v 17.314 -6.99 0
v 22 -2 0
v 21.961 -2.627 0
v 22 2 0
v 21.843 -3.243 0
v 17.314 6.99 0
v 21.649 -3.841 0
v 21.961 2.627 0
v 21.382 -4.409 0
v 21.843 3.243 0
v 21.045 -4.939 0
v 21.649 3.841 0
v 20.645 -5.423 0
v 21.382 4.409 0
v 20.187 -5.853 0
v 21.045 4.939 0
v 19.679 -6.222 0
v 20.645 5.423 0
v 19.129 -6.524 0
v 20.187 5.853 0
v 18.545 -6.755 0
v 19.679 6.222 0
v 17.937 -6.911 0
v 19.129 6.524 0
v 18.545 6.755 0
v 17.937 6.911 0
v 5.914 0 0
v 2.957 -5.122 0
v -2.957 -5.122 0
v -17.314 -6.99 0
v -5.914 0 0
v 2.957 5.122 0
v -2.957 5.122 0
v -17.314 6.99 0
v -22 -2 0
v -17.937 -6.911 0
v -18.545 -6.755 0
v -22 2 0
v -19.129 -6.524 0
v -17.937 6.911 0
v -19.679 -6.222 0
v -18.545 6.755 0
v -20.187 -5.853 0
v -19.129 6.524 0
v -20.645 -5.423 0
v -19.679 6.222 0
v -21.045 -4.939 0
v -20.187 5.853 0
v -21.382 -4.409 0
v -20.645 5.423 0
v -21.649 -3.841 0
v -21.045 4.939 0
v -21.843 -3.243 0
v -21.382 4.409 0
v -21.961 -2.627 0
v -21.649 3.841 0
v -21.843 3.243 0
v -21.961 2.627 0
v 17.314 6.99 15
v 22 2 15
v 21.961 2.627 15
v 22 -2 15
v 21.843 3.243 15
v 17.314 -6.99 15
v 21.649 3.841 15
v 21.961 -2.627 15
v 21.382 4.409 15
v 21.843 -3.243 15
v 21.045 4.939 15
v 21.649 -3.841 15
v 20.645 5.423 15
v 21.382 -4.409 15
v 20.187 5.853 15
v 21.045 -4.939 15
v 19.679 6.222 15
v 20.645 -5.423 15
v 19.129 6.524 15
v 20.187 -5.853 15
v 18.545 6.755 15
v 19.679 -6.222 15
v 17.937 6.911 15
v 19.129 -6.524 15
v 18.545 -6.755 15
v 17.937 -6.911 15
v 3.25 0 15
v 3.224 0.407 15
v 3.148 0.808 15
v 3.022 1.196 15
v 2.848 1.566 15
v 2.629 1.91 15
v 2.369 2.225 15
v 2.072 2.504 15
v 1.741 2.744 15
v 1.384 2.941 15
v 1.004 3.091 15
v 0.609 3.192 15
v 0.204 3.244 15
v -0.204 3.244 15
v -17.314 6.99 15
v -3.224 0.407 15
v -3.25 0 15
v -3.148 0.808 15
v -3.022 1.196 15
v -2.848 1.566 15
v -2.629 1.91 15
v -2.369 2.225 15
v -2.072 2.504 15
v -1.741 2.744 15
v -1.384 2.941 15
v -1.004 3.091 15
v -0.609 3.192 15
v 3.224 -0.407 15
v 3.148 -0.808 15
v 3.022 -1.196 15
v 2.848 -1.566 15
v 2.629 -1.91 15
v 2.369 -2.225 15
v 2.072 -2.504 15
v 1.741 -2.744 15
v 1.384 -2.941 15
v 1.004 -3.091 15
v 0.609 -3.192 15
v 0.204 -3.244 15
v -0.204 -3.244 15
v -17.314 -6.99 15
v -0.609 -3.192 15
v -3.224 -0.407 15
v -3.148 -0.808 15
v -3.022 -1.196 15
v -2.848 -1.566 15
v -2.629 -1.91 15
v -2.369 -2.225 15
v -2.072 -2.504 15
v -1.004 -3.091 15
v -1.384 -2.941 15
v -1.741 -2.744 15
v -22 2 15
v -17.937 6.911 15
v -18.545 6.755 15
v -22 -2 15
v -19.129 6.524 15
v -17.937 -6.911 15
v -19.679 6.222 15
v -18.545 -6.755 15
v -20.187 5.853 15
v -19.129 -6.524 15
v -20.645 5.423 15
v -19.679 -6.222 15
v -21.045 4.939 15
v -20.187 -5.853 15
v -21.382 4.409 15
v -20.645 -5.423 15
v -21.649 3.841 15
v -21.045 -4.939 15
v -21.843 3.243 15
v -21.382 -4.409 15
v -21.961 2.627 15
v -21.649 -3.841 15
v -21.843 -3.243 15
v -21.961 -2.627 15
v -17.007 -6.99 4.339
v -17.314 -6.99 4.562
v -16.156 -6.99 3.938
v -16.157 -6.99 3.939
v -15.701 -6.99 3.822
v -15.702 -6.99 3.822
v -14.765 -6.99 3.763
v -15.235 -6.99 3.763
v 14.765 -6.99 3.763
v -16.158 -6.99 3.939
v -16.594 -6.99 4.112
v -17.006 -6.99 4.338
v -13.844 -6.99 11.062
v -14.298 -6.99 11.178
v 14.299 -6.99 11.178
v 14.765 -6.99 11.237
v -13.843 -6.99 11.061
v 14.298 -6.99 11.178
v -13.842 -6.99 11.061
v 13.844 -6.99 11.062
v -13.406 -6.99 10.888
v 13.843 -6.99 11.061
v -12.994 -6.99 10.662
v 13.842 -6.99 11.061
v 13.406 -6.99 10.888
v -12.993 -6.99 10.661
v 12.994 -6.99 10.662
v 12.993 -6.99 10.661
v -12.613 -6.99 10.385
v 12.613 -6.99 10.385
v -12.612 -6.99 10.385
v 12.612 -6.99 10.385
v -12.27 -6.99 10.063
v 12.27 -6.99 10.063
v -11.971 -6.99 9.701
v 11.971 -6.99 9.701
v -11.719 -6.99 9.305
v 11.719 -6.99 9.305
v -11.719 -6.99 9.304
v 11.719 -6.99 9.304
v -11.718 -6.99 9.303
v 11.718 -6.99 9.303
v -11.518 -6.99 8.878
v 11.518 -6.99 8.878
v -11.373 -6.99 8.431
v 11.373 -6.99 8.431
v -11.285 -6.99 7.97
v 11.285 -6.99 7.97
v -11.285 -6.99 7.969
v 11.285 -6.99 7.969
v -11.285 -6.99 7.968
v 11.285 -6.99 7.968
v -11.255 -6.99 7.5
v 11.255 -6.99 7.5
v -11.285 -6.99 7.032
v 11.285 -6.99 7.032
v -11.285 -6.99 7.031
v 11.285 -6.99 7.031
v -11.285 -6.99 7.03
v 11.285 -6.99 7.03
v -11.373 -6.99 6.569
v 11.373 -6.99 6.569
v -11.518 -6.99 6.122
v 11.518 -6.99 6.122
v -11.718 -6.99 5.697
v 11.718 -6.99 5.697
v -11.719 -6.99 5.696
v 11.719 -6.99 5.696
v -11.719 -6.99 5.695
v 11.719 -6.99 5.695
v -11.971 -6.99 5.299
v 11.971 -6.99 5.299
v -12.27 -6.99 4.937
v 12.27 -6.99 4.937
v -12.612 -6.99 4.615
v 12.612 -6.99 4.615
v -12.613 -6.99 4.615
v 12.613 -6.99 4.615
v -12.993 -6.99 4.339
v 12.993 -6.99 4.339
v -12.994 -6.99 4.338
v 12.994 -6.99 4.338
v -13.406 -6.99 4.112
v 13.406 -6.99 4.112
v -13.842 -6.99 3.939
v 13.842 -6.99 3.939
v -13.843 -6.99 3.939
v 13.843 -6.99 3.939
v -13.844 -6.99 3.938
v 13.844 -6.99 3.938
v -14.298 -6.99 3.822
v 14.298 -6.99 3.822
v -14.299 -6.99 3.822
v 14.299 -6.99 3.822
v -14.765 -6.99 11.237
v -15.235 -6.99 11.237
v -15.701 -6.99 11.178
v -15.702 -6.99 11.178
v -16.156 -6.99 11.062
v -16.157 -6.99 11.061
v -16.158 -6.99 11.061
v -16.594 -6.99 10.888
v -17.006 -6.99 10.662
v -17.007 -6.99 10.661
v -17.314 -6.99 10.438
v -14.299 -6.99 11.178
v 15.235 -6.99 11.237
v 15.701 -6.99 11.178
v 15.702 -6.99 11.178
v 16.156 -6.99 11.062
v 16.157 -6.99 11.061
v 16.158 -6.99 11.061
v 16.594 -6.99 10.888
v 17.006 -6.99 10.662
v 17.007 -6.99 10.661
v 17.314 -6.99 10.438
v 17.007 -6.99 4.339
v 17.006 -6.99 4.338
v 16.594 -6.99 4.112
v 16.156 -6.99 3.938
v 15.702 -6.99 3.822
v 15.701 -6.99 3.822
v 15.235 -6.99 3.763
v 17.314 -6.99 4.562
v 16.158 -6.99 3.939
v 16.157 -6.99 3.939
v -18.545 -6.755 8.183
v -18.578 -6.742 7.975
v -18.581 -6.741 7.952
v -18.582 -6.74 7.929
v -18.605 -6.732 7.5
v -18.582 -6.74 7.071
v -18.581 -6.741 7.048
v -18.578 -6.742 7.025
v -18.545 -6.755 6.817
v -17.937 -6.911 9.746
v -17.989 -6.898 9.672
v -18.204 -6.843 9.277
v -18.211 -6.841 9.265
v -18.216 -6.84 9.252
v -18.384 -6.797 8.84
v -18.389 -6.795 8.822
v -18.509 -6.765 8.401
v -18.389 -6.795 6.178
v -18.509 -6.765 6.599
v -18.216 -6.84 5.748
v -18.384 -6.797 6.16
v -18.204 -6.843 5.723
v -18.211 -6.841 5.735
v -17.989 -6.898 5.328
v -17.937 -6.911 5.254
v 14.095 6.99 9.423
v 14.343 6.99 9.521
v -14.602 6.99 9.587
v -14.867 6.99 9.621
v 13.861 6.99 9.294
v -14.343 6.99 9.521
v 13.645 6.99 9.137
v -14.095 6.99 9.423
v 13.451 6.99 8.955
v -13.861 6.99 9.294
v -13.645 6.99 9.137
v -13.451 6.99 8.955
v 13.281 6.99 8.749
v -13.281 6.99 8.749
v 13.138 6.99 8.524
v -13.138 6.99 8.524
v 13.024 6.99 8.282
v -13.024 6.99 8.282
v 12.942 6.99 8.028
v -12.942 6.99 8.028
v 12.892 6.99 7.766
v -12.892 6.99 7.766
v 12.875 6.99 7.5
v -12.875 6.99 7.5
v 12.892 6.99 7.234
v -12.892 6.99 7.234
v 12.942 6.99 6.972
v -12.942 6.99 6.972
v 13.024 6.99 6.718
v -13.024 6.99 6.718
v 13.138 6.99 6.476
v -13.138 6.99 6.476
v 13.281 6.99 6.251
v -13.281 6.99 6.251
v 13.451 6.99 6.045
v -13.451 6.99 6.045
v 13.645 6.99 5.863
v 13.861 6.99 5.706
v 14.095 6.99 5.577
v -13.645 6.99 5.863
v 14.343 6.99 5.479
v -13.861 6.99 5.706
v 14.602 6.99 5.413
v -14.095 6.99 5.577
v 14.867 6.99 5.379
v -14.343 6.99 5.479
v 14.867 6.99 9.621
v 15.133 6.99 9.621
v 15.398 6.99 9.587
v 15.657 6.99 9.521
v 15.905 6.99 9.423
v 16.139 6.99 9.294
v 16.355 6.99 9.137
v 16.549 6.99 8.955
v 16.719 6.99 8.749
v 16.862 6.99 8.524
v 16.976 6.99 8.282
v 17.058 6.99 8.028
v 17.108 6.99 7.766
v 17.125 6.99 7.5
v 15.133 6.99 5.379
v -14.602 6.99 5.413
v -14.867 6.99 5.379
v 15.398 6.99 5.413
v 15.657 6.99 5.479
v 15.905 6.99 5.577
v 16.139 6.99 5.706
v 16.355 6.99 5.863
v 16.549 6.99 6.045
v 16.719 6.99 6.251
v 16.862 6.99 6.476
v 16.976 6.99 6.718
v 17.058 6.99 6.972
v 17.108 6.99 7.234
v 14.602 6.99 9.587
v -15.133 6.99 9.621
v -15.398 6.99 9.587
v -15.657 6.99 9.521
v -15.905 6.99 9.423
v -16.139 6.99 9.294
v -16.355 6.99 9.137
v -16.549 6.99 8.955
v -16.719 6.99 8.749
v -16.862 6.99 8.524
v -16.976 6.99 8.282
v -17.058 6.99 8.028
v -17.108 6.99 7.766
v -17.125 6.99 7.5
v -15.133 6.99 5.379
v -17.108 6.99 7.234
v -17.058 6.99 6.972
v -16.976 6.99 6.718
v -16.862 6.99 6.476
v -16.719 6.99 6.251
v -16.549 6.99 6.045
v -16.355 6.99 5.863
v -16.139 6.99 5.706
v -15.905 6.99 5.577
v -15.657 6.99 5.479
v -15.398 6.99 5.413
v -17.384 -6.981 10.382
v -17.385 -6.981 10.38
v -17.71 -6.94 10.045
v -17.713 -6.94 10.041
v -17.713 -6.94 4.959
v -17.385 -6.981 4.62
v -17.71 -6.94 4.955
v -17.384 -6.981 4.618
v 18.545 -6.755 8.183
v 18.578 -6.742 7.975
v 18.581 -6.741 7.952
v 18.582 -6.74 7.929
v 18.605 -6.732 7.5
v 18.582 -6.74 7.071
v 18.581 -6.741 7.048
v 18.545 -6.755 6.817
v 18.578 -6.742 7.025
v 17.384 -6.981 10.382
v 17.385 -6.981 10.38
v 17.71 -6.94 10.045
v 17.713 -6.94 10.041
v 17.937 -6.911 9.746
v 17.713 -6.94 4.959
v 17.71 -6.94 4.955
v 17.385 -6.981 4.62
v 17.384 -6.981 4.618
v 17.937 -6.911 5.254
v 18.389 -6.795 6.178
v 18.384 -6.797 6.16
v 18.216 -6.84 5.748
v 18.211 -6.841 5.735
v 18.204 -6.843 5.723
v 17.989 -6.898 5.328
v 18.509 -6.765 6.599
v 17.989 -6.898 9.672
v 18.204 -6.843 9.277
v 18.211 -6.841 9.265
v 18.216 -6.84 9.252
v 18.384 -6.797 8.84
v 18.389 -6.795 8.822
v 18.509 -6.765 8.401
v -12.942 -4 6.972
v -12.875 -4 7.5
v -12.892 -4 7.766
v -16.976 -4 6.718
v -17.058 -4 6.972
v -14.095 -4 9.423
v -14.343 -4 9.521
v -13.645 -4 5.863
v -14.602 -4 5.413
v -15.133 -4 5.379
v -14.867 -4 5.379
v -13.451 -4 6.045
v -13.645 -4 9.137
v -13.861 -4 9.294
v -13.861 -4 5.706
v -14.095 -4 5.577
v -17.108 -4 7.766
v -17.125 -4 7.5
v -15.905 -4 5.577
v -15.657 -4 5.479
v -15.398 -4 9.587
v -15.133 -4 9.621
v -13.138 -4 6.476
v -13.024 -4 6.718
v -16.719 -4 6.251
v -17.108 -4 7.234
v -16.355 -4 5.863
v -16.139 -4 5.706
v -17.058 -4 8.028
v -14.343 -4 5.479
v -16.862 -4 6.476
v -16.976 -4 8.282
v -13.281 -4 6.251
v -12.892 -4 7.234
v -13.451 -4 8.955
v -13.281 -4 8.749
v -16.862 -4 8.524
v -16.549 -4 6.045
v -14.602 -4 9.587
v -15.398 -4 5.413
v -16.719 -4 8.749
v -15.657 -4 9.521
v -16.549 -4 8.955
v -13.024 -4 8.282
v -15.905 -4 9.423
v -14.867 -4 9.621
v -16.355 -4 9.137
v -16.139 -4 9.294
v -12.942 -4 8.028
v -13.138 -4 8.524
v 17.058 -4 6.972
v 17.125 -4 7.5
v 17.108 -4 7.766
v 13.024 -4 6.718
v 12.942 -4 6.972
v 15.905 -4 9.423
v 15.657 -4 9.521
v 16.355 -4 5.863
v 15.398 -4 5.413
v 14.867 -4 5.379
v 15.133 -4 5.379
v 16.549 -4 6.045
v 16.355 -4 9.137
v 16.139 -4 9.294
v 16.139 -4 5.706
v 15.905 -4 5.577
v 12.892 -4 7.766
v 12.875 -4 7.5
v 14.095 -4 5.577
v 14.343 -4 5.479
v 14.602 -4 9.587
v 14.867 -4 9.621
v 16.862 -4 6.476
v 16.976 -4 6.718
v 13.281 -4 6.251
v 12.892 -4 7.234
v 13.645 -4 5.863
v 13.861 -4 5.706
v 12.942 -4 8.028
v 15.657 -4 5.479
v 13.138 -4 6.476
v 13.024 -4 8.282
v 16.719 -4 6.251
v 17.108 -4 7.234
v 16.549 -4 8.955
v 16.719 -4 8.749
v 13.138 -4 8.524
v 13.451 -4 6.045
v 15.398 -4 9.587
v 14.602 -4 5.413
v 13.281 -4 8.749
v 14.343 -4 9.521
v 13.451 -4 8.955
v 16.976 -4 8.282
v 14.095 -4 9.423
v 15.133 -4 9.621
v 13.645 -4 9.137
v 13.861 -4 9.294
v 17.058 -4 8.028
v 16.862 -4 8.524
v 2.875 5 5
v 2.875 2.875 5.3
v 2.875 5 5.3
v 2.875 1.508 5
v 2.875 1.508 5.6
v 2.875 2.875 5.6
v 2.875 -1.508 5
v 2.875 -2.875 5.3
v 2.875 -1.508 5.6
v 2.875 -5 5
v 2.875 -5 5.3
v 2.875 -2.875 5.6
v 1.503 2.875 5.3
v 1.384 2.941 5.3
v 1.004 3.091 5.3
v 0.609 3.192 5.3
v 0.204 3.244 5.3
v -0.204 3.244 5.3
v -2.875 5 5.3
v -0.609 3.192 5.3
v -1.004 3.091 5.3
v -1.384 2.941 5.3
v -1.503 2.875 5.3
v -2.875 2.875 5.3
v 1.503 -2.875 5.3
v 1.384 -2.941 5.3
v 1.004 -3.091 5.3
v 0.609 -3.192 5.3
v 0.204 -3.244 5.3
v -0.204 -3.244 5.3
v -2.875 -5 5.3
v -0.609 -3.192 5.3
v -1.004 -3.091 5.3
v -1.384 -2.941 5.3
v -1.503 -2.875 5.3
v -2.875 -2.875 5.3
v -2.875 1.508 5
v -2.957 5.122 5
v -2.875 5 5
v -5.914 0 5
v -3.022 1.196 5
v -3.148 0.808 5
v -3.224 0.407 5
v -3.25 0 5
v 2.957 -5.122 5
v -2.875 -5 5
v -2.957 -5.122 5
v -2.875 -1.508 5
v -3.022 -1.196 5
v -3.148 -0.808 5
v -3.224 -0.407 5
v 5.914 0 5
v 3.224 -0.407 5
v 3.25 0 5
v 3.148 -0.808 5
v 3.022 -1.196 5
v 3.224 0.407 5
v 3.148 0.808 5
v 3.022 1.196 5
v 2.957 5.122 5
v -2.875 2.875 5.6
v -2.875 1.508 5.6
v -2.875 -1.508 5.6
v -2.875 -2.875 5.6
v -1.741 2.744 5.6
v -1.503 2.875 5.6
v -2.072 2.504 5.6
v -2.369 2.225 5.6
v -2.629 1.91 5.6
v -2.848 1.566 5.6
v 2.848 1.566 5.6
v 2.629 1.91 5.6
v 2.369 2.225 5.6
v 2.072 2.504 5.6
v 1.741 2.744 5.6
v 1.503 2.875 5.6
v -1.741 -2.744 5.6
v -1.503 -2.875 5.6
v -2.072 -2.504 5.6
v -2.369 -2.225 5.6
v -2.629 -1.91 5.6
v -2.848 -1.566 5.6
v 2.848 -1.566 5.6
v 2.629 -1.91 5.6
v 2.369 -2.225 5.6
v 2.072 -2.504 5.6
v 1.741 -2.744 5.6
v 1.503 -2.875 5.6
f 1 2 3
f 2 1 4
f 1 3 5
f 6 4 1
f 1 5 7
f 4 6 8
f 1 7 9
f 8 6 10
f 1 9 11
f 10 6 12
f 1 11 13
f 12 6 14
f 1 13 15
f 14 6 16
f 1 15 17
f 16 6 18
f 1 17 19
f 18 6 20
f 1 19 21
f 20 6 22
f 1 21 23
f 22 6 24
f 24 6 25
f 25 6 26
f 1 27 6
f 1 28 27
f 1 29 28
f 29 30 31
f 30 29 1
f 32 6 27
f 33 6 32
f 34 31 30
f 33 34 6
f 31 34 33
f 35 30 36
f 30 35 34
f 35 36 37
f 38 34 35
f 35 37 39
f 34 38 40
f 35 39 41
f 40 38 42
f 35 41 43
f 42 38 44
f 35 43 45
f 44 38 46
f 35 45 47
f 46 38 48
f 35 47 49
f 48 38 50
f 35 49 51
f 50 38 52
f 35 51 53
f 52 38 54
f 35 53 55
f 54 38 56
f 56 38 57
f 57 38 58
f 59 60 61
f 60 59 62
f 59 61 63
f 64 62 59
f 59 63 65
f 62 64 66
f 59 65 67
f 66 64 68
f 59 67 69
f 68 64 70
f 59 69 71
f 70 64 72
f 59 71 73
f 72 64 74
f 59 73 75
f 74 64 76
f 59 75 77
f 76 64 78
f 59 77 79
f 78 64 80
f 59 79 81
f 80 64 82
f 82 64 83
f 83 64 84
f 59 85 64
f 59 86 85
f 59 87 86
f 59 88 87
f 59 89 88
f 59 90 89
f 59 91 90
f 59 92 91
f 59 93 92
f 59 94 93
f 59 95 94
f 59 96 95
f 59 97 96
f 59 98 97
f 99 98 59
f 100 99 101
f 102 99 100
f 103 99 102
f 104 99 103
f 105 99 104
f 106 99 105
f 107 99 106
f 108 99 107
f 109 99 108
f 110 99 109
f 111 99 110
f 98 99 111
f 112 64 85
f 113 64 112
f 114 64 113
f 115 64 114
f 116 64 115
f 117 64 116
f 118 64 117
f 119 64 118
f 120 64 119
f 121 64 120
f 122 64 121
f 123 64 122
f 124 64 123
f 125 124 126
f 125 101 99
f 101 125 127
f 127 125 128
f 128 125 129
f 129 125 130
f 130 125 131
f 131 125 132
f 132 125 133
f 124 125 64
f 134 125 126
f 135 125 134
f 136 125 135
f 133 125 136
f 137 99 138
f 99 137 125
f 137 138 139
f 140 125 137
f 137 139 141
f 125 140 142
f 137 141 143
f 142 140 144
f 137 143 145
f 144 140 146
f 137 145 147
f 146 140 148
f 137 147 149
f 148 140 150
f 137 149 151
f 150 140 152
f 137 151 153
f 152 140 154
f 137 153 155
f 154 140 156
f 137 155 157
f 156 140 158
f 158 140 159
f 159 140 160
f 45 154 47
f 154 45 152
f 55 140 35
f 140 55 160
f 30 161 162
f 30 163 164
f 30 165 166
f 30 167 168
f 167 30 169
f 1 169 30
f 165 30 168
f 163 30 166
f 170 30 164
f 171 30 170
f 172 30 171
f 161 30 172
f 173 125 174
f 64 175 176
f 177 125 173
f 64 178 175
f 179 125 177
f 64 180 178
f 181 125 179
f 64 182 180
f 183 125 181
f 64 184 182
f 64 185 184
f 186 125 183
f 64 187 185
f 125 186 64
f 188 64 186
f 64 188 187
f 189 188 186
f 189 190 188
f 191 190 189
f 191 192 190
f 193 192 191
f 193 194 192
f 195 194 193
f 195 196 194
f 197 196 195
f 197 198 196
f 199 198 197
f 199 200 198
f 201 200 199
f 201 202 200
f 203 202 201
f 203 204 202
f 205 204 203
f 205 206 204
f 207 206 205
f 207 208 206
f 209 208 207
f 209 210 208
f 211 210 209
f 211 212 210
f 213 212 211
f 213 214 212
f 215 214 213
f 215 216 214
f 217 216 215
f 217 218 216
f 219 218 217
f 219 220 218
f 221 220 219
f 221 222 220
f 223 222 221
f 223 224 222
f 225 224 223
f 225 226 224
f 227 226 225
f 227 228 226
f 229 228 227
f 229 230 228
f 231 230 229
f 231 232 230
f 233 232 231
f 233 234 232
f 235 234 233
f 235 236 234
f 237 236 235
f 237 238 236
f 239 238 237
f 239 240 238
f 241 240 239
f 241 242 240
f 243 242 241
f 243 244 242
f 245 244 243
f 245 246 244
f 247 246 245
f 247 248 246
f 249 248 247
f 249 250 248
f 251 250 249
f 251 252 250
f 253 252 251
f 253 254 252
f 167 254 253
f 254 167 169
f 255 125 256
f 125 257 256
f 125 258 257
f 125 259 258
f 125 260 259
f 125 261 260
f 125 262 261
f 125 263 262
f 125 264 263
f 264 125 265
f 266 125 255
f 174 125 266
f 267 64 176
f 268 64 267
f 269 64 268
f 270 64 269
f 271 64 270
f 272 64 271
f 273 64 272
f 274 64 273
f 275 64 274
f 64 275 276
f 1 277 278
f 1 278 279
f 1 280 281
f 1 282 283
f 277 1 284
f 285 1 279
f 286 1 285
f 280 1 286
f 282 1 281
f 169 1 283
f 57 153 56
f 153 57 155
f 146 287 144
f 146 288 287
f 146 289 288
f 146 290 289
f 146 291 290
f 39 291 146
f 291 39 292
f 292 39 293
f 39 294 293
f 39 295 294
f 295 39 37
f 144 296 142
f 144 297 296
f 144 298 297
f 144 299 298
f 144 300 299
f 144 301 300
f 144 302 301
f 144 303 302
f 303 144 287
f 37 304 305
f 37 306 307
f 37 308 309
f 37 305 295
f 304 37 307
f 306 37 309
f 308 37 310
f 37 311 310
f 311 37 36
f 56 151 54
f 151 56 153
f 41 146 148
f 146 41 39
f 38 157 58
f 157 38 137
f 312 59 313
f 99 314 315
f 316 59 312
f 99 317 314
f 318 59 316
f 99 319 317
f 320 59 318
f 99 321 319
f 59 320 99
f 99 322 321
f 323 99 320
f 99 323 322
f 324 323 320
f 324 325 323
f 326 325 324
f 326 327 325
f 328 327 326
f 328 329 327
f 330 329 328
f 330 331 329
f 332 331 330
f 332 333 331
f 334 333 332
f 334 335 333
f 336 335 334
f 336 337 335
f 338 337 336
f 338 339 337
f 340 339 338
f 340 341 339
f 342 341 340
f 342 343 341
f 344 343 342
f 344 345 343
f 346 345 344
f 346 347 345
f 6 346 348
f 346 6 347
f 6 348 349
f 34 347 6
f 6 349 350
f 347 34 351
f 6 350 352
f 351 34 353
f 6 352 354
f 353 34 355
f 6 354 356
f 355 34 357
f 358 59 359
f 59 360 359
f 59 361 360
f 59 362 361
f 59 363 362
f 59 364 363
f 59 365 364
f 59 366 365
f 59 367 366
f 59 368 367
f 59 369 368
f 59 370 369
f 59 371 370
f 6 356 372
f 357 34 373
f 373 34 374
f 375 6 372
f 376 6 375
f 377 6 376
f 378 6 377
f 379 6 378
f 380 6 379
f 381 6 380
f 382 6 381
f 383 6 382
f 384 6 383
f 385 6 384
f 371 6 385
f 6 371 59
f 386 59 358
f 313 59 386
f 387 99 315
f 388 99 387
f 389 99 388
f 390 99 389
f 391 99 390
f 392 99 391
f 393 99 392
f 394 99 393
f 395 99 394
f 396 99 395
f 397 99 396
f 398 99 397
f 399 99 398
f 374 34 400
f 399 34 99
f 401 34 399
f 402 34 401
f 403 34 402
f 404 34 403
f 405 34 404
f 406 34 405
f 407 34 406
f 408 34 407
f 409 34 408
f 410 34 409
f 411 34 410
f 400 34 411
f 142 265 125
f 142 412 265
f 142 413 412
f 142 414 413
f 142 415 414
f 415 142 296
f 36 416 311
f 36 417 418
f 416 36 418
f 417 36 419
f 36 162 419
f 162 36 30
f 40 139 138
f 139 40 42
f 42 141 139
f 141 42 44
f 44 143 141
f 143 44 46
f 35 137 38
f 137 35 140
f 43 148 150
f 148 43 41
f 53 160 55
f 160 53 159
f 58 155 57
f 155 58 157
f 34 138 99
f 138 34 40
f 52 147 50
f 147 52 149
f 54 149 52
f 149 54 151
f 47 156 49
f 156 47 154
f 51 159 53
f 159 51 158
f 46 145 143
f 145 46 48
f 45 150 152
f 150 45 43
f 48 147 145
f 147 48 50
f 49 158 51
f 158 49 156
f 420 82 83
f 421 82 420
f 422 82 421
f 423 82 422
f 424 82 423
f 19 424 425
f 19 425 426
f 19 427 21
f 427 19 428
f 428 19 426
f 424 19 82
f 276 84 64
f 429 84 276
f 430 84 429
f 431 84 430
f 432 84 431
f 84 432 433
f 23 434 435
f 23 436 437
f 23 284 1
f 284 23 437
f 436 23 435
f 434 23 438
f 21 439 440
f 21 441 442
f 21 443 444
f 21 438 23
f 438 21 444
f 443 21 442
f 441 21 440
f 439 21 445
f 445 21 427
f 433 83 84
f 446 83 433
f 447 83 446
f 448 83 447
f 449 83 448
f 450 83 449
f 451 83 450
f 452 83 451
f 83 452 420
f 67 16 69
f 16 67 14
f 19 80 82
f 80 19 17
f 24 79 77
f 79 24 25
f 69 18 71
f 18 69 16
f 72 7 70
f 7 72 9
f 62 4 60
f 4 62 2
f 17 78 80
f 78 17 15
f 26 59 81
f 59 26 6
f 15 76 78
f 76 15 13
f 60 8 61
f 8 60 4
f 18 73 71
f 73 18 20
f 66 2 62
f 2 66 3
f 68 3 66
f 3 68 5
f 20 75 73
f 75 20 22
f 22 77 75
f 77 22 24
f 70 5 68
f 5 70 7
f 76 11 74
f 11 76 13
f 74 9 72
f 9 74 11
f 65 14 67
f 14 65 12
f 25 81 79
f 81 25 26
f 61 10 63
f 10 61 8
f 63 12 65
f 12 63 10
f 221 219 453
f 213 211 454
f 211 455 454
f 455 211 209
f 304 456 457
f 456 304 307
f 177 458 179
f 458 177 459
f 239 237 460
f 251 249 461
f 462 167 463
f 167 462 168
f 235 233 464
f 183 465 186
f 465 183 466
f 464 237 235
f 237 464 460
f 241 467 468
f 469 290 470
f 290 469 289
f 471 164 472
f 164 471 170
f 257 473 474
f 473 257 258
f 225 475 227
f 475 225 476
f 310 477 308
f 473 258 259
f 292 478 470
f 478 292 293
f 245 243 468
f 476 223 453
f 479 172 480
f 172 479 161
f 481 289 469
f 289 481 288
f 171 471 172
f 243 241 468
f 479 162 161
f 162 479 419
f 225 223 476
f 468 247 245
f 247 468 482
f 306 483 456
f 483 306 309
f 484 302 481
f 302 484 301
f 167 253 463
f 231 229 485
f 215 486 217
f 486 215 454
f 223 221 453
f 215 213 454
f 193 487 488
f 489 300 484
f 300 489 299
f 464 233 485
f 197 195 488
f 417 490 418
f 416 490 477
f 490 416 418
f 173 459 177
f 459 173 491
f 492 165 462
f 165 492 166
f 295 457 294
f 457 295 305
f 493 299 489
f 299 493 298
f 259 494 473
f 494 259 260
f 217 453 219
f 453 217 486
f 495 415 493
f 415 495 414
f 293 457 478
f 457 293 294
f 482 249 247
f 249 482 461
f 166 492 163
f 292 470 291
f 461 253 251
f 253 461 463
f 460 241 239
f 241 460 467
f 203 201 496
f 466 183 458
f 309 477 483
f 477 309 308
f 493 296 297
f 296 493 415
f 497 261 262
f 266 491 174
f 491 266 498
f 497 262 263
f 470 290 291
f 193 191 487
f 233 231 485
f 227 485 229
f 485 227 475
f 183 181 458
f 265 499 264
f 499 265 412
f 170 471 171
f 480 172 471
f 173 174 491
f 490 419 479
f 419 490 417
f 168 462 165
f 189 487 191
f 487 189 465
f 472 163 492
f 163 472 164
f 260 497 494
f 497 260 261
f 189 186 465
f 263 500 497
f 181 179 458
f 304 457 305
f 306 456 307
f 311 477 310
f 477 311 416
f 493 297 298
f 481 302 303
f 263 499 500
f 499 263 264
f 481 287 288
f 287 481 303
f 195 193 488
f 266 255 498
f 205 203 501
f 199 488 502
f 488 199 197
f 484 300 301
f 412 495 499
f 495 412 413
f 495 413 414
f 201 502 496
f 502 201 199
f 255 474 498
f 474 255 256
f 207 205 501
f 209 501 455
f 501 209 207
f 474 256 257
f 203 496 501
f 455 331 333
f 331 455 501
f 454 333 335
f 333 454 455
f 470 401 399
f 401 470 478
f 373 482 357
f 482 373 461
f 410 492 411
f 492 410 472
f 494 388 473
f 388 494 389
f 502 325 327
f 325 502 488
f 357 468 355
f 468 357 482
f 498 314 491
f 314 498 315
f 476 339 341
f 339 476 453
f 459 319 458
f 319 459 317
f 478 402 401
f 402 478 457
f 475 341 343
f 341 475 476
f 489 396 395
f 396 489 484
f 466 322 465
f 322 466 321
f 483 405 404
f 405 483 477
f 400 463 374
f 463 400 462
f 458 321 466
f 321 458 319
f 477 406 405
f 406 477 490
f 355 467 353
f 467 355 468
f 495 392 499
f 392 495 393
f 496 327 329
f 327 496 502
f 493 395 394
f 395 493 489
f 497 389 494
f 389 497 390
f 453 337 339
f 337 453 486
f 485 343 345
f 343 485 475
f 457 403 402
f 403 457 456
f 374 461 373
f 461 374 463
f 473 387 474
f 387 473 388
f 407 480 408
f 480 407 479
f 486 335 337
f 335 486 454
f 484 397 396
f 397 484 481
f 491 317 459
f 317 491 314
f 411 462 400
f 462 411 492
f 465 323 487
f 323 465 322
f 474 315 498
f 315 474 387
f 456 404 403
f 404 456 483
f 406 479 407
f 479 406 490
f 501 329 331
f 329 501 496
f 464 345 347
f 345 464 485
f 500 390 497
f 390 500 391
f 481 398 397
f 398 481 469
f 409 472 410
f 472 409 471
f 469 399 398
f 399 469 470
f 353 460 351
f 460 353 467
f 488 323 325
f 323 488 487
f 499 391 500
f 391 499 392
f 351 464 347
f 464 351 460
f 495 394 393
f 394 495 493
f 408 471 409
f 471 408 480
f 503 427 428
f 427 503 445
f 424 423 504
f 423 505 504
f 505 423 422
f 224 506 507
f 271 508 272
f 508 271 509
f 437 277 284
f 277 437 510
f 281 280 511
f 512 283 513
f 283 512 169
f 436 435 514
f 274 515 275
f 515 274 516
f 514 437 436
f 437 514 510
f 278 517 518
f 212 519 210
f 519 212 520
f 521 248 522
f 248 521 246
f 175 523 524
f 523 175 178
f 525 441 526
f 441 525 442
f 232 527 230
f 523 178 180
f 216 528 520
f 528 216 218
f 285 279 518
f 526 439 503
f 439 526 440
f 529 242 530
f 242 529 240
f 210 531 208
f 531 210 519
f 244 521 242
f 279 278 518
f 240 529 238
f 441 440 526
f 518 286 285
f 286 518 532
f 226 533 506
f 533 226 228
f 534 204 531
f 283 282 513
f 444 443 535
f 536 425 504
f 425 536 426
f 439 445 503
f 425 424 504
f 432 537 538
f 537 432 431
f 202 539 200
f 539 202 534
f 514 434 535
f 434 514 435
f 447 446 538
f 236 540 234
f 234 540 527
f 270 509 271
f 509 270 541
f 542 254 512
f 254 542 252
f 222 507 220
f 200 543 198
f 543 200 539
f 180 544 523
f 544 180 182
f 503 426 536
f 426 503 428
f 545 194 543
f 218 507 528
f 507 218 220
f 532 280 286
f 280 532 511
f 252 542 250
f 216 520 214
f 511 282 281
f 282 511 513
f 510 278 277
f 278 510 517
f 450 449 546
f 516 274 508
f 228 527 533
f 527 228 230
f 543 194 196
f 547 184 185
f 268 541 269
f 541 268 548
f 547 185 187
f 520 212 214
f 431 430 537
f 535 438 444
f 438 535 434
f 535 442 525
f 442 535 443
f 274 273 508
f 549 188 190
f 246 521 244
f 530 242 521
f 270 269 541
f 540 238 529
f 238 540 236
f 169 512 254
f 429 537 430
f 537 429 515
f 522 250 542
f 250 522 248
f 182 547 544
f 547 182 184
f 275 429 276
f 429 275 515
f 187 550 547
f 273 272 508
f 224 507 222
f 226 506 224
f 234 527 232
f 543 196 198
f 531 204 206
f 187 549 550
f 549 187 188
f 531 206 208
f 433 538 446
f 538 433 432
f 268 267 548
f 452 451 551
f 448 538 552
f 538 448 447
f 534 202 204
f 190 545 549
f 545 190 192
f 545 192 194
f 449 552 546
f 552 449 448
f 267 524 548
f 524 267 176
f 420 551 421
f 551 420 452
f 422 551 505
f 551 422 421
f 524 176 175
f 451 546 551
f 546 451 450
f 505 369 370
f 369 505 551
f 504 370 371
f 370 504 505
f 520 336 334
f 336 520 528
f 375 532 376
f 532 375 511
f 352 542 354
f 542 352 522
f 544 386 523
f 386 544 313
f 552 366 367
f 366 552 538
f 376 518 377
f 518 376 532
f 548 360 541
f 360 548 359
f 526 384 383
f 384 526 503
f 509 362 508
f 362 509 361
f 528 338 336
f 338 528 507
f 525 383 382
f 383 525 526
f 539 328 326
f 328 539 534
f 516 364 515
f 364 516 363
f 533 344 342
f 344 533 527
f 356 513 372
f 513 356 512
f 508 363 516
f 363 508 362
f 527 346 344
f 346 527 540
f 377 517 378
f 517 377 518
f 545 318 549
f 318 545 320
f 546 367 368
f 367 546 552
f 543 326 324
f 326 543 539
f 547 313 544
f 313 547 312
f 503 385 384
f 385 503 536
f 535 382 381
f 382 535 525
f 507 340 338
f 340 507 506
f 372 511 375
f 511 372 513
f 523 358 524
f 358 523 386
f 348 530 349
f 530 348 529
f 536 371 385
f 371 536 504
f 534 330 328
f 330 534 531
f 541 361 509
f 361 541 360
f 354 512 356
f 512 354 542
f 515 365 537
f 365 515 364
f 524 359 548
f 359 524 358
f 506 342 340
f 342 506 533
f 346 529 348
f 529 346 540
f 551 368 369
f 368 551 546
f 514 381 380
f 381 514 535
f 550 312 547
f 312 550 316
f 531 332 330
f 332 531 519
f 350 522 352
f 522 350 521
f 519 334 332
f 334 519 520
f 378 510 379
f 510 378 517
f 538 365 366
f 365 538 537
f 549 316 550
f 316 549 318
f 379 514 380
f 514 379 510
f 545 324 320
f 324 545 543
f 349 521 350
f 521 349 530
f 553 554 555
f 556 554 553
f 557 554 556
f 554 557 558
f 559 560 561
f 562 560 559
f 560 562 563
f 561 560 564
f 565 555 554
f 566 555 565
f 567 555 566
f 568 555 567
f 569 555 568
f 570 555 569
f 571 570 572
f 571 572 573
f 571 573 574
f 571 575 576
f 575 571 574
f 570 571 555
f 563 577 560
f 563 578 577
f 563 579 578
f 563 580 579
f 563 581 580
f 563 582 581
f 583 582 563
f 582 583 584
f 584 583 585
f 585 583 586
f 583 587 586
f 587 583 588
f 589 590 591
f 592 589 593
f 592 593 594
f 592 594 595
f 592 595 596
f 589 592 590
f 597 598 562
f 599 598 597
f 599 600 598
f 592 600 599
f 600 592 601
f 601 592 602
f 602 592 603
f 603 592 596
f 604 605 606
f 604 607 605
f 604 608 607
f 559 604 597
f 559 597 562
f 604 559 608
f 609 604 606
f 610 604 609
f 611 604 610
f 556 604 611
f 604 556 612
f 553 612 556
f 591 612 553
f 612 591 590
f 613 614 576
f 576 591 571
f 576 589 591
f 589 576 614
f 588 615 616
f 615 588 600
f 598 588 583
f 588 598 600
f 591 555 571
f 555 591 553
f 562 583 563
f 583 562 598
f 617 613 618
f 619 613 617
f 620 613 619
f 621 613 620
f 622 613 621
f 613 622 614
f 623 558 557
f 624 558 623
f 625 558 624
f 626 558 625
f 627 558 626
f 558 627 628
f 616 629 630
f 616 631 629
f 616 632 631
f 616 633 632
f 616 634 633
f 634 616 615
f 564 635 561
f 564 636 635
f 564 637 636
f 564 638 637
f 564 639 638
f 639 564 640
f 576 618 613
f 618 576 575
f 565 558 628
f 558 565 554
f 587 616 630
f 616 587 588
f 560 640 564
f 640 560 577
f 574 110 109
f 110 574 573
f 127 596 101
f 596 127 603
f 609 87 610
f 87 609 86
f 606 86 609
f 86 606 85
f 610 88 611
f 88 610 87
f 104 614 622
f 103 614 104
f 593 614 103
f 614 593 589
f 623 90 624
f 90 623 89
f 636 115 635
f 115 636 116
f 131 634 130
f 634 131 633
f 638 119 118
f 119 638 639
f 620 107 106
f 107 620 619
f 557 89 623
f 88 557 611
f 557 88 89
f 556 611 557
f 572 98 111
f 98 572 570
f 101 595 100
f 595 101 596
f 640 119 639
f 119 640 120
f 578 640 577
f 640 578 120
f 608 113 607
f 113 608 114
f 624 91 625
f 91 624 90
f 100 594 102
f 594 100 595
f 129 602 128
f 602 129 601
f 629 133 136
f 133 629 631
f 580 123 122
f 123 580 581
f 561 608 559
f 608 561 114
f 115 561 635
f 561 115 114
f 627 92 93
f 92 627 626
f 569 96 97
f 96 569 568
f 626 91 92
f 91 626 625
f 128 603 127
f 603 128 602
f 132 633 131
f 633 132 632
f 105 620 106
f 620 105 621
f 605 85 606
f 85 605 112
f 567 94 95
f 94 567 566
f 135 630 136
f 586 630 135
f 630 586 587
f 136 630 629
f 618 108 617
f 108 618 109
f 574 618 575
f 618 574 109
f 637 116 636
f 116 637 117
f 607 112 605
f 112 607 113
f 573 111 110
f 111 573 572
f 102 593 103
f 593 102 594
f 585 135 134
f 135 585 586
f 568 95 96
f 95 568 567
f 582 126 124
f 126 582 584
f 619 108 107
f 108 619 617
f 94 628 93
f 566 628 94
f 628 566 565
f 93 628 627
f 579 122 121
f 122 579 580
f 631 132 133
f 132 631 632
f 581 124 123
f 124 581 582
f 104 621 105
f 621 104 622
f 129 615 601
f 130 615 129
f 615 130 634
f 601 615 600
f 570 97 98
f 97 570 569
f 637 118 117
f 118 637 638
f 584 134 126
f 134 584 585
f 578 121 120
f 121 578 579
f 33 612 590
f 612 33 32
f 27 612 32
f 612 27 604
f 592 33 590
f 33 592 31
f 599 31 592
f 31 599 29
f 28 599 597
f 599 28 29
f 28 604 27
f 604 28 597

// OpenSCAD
$fn = 50;


difference() {
	union() {
		cylinder(h = 15, r = 7.0000000000);
		translate(v = [-7.5000000000, 0.0000000000, 0]) {
			hull() {
				translate(v = [-9.5000000000, 2.0000000000, 0]) {
					cylinder(h = 15, r = 5);
				}
				translate(v = [9.5000000000, 2.0000000000, 0]) {
					cylinder(h = 15, r = 5);
				}
				translate(v = [-9.5000000000, -2.0000000000, 0]) {
					cylinder(h = 15, r = 5);
				}
				translate(v = [9.5000000000, -2.0000000000, 0]) {
					cylinder(h = 15, r = 5);
				}
			}
		}
		translate(v = [-7.5000000000, 0.0000000000, 0]) {
			hull() {
				translate(v = [-9.5000000000, 2.0000000000, 0]) {
					cylinder(h = 15, r = 5);
				}
				translate(v = [9.5000000000, 2.0000000000, 0]) {
					cylinder(h = 15, r = 5);
				}
				translate(v = [-9.5000000000, -2.0000000000, 0]) {
					cylinder(h = 15, r = 5);
				}
				translate(v = [9.5000000000, -2.0000000000, 0]) {
					cylinder(h = 15, r = 5);
				}
			}
		}
		translate(v = [7.5000000000, 0.0000000000, 0]) {
			hull() {
				translate(v = [-9.5000000000, 2.0000000000, 0]) {
					cylinder(h = 15, r = 5);
				}
				translate(v = [9.5000000000, 2.0000000000, 0]) {
					cylinder(h = 15, r = 5);
				}
				translate(v = [-9.5000000000, -2.0000000000, 0]) {
					cylinder(h = 15, r = 5);
				}
				translate(v = [9.5000000000, -2.0000000000, 0]) {
					cylinder(h = 15, r = 5);
				}
			}
		}
		translate(v = [7.5000000000, 0.0000000000, 0]) {
			hull() {
				translate(v = [-9.5000000000, 2.0000000000, 0]) {
					cylinder(h = 15, r = 5);
				}
				translate(v = [9.5000000000, 2.0000000000, 0]) {
					cylinder(h = 15, r = 5);
				}
				translate(v = [-9.5000000000, -2.0000000000, 0]) {
					cylinder(h = 15, r = 5);
				}
				translate(v = [9.5000000000, -2.0000000000, 0]) {
					cylinder(h = 15, r = 5);
				}
			}
		}
	}
	union() {
		translate(v = [-15.0000000000, -7.0000000000, 7.5000000000]) {
			rotate(a = [90, 0, 0]) {
				difference() {
					union() {
						#translate(v = [0, 0, -14.0000000000]) {
							cylinder(h = 14, r = 2.0000000000);
						}
						#translate(v = [0, 0, -3]) {
							cylinder(h = 3, r1 = 2.1250000000, r2 = 3.7500000000);
						}
						#translate(v = [0, 0, -14.0000000000]) {
							cylinder(h = 14, r = 2.1250000000);
						}
						#translate(v = [0, 0, -14.0000000000]) {
							cylinder(h = 14, r = 2.0000000000);
						}
					}
					union();
				}
			}
		}
		translate(v = [15.0000000000, -7.0000000000, 7.5000000000]) {
			rotate(a = [90, 0, 0]) {
				difference() {
					union() {
						#translate(v = [0, 0, -14.0000000000]) {
							cylinder(h = 14, r = 2.0000000000);
						}
						#translate(v = [0, 0, -3]) {
							cylinder(h = 3, r1 = 2.1250000000, r2 = 3.7500000000);
						}
						#translate(v = [0, 0, -14.0000000000]) {
							cylinder(h = 14, r = 2.1250000000);
						}
						#translate(v = [0, 0, -14.0000000000]) {
							cylinder(h = 14, r = 2.0000000000);
						}
					}
					union();
				}
			}
		}
		translate(v = [0.0000000000, 0.0000000000, 0]) {
			rotate(a = [0, 0, 0]) {
				difference() {
					union() {
						#translate(v = [-2.8750000000, -5.0000000000, -0.3000000000]) {
							cube(size = [5.7500000000, 10, 0.3000000000]);
						}
						#translate(v = [-2.8750000000, -2.8750000000, -0.6000000000]) {
							cube(size = [5.7500000000, 5.7500000000, 0.3000000000]);
						}
						#translate(v = [-2.8750000000, -5.0000000000, 5]) {
							cube(size = [5.7500000000, 10, 0.3000000000]);
						}
						#translate(v = [-2.8750000000, -2.8750000000, 5.3000000000]) {
							cube(size = [5.7500000000, 5.7500000000, 0.3000000000]);
						}
						#translate(v = [0, 0, -100.0000000000]) {
							cylinder(h = 200, r = 3.2500000000);
						}
						#linear_extrude(height = 5) {
							polygon(points = [[5.9142500000, 0.0000000000], [2.9571250000, 5.1218907443], [-2.9571250000, 5.1218907443], [-5.9142500000, 0.0000000000], [-2.9571250000, -5.1218907443], [2.9571250000, -5.1218907443]]);
						}
						#translate(v = [-2.8750000000, -5.0000000000, -0.3000000000]) {
							cube(size = [5.7500000000, 10, 0.3000000000]);
						}
						#translate(v = [-2.8750000000, -2.8750000000, -0.6000000000]) {
							cube(size = [5.7500000000, 5.7500000000, 0.3000000000]);
						}
						#translate(v = [-2.8750000000, -5.0000000000, 5]) {
							cube(size = [5.7500000000, 10, 0.3000000000]);
						}
						#translate(v = [-2.8750000000, -2.8750000000, 5.3000000000]) {
							cube(size = [5.7500000000, 5.7500000000, 0.3000000000]);
						}
						#translate(v = [0, 0, -100.0000000000]) {
							cylinder(h = 200, r = 3.2500000000);
						}
						#translate(v = [-2.8750000000, -5.0000000000, -0.3000000000]) {
							cube(size = [5.7500000000, 10, 0.3000000000]);
						}
						#translate(v = [-2.8750000000, -2.8750000000, -0.6000000000]) {
							cube(size = [5.7500000000, 5.7500000000, 0.3000000000]);
						}
						#translate(v = [-2.8750000000, -5.0000000000, 5]) {
							cube(size = [5.7500000000, 10, 0.3000000000]);
						}
						#translate(v = [-2.8750000000, -2.8750000000, 5.3000000000]) {
							cube(size = [5.7500000000, 5.7500000000, 0.3000000000]);
						}
						#translate(v = [0, 0, -100.0000000000]) {
							cylinder(h = 200, r = 3.2500000000);
						}
					}
					union();
				}
			}
		}
		translate(v = [0, 0, -100]) {
			cylinder(h = 200, r = 3.2500000000);
		}
		translate(v = [0, 0, -100]) {
			cylinder(h = 200, r = 1.8000000000);
		}
	}
}
